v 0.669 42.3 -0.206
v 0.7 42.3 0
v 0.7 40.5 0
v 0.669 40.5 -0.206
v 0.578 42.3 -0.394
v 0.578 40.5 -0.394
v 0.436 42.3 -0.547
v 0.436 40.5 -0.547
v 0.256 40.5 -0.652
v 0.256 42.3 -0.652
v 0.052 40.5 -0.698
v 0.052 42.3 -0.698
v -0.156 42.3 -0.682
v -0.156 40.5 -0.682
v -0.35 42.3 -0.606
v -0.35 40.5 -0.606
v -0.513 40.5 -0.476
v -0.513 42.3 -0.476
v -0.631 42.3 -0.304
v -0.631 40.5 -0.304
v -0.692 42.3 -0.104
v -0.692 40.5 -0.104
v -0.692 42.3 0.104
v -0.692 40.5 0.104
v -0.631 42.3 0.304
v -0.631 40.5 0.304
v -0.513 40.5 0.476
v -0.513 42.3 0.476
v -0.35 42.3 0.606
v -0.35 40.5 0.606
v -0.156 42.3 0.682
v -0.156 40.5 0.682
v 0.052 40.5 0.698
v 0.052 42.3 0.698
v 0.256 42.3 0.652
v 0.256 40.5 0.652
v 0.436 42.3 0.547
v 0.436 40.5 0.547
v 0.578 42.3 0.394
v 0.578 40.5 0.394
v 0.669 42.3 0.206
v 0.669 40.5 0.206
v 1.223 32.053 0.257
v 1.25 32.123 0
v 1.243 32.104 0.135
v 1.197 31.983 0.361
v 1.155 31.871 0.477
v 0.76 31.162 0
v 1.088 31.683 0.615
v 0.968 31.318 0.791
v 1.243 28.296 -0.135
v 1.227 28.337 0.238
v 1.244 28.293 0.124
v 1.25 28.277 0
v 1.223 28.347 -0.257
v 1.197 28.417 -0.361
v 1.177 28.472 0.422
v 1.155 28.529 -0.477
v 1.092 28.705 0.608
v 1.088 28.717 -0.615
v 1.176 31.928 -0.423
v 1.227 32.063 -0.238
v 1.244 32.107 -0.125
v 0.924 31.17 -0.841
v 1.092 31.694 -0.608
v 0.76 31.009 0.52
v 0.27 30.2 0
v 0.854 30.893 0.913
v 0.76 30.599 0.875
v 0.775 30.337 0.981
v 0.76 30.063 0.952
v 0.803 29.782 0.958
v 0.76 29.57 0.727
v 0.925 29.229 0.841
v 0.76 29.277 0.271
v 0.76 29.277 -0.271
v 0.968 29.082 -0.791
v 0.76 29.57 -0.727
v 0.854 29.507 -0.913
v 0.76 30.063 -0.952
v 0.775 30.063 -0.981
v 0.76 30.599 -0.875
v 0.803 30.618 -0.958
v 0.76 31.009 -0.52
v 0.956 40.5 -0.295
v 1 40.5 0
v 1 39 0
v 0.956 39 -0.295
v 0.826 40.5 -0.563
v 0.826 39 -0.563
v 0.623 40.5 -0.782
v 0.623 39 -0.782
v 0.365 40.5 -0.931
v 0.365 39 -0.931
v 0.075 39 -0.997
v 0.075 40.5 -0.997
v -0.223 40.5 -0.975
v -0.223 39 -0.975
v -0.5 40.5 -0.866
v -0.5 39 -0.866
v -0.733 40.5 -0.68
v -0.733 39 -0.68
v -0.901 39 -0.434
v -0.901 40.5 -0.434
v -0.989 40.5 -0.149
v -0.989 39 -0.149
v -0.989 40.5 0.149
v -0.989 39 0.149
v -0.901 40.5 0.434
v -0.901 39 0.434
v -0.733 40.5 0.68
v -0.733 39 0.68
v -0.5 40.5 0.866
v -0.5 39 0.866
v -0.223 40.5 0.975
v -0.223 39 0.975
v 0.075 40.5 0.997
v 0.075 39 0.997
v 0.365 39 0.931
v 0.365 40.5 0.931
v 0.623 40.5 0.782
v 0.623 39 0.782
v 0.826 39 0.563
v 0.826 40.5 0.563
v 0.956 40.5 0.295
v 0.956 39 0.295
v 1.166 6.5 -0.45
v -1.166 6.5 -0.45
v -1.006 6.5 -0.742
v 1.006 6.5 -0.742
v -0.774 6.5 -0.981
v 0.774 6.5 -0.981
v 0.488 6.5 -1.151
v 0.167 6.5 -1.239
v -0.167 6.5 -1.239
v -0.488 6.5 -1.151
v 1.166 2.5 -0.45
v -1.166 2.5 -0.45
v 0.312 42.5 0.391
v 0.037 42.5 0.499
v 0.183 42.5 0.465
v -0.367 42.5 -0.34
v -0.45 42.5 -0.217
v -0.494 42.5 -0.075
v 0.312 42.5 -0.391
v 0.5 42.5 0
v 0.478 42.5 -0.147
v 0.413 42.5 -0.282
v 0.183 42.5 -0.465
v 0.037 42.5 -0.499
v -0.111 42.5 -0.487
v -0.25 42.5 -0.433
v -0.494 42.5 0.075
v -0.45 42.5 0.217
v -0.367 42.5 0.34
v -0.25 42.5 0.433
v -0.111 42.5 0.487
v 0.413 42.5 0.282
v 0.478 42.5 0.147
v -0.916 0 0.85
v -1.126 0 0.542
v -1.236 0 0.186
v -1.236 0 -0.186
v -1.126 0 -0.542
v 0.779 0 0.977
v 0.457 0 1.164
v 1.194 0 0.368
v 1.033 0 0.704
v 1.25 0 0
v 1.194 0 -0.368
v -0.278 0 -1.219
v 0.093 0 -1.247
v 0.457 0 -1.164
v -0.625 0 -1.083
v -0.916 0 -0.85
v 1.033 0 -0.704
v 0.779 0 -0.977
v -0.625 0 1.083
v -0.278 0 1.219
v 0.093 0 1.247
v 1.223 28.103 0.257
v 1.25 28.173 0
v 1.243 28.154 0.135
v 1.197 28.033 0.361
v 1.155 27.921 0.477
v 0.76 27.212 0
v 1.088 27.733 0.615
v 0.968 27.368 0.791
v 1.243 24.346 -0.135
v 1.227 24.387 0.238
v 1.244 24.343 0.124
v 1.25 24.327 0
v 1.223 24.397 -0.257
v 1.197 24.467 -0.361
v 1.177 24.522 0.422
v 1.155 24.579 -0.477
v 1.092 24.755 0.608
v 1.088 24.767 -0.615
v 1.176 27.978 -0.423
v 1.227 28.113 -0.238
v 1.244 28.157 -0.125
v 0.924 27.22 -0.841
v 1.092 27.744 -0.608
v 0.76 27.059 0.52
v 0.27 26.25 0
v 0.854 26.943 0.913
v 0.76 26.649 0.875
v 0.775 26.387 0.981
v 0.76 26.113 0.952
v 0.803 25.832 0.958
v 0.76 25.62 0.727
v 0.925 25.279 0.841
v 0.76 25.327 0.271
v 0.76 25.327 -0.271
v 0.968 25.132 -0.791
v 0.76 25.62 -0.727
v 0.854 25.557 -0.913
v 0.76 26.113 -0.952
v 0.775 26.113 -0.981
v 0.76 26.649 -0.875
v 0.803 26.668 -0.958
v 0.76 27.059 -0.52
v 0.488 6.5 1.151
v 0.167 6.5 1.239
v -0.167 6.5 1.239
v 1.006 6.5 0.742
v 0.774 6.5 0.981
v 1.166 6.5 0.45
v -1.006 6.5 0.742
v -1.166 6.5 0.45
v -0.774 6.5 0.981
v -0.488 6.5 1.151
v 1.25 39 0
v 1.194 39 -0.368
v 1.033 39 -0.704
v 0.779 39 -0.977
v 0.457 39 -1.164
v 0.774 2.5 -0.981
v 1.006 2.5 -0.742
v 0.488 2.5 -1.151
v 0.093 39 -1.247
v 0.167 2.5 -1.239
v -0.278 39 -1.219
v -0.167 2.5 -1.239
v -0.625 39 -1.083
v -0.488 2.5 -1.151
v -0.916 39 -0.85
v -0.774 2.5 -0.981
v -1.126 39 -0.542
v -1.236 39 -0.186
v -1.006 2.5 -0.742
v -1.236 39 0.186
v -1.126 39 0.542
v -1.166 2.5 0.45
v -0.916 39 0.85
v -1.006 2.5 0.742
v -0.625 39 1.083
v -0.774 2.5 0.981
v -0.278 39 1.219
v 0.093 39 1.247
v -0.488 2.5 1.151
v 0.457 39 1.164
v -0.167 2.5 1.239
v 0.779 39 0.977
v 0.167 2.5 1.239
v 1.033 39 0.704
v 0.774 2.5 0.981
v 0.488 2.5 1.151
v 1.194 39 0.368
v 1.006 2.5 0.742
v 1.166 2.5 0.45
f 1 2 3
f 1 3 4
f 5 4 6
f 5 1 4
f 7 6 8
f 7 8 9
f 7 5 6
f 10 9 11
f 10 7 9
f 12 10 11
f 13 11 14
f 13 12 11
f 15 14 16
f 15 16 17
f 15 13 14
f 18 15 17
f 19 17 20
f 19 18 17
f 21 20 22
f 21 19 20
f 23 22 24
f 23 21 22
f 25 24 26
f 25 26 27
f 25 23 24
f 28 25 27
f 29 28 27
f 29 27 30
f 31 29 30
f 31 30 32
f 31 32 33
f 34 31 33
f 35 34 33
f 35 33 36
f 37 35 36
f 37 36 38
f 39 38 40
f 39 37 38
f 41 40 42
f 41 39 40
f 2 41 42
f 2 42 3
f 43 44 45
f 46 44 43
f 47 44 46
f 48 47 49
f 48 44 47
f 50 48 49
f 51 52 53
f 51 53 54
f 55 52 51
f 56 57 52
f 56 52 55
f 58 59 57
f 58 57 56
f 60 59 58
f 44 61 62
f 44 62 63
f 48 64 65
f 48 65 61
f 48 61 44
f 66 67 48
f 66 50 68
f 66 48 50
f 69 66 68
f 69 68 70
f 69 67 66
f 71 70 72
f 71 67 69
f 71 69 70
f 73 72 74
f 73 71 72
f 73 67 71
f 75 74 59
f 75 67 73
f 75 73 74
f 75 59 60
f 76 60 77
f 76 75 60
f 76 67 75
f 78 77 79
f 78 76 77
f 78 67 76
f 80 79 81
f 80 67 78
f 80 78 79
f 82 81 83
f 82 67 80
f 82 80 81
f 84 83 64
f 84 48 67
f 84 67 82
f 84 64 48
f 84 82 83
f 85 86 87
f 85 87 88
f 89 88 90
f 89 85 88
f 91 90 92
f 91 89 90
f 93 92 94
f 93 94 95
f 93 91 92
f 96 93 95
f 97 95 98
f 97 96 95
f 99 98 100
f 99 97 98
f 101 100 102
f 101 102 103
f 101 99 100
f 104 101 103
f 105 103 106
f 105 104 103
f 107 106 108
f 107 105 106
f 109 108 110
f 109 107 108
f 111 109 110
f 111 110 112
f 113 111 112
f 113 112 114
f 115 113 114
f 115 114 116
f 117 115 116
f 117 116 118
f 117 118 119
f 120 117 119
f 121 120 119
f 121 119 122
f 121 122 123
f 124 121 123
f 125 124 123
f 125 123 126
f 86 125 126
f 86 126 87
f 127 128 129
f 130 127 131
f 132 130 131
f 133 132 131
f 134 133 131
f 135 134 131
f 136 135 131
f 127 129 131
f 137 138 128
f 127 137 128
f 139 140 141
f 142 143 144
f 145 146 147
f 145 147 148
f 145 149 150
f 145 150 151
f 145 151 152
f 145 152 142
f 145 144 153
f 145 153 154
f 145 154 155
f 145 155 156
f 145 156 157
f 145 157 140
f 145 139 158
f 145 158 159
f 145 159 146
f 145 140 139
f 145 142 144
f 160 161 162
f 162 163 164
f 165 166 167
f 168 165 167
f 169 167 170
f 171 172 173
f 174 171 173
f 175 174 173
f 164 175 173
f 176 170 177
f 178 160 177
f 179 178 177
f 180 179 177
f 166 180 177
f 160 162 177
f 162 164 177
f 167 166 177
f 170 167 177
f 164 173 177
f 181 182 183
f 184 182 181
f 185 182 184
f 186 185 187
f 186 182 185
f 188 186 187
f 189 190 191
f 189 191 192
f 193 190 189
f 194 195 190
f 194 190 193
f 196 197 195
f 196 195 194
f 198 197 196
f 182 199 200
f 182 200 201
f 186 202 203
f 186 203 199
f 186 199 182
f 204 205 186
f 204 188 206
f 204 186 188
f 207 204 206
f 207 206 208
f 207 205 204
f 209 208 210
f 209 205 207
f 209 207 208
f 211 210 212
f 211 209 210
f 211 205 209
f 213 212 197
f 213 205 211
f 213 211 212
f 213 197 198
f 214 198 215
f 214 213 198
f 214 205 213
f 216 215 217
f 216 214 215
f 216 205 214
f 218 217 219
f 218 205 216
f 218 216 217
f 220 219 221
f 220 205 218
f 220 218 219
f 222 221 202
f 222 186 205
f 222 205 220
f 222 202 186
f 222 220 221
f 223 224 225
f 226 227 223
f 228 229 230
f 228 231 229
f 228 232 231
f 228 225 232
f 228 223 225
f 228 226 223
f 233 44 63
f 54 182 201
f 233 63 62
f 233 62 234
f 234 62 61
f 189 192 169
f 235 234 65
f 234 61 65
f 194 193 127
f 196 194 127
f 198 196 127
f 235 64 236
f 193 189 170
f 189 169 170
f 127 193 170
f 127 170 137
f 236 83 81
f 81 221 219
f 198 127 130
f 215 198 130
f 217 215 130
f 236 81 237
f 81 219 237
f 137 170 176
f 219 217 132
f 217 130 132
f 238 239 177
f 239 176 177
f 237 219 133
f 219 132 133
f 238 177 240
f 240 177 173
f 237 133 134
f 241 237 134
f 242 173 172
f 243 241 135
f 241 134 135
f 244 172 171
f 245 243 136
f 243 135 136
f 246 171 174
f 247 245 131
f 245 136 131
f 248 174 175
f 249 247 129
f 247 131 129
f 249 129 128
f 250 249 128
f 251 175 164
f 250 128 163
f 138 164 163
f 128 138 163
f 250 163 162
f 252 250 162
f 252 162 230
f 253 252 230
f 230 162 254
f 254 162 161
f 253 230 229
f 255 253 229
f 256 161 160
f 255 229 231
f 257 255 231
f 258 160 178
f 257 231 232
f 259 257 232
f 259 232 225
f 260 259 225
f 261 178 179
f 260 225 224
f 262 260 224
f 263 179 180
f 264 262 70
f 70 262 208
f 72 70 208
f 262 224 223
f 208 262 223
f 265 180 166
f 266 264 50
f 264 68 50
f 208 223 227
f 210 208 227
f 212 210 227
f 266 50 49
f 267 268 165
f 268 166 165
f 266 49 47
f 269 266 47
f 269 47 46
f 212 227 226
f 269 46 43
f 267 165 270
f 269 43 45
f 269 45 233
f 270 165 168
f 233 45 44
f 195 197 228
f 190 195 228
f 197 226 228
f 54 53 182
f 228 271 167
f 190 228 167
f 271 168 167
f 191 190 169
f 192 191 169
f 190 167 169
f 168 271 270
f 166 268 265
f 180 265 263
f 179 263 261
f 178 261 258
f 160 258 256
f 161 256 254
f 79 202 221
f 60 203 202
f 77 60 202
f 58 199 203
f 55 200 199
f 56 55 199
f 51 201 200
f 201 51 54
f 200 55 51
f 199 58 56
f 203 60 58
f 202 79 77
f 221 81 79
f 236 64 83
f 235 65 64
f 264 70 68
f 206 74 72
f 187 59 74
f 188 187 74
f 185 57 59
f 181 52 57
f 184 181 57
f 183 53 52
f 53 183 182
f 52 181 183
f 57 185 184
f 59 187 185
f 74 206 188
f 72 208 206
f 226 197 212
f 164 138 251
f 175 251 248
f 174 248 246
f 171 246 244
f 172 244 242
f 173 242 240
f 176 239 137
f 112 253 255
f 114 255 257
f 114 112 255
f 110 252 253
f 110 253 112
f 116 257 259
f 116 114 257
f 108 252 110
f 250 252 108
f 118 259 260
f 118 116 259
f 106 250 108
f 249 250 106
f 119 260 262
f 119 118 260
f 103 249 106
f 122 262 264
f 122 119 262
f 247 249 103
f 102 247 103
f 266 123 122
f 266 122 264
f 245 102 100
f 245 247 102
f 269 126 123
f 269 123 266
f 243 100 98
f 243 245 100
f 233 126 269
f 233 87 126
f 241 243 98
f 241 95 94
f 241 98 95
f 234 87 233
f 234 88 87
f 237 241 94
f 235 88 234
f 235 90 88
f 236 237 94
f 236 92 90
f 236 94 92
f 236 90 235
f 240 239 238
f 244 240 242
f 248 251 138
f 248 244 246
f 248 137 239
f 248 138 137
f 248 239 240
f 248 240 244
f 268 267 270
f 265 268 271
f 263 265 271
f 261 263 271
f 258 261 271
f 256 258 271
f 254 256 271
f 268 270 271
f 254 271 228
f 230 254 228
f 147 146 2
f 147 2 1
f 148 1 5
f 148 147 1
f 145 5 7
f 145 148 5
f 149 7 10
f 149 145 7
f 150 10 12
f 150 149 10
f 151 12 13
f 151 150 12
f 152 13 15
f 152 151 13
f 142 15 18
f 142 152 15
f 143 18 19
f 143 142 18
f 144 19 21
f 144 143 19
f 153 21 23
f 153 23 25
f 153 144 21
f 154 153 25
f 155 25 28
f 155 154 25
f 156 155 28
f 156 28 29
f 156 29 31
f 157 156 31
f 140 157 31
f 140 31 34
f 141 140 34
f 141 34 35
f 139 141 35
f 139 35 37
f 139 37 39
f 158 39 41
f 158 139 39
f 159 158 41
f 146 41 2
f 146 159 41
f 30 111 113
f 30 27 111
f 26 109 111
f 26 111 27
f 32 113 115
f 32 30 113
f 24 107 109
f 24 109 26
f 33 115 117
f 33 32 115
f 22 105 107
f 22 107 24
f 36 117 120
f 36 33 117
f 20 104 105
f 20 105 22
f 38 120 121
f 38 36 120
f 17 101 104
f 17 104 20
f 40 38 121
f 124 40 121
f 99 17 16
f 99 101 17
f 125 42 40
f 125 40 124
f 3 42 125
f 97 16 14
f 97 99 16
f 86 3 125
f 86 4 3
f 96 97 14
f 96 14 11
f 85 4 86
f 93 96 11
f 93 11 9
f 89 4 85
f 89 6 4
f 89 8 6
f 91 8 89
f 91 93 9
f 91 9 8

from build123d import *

# Parameters (mm, degrees)
SKETCH1_R               = 1.25
BOSS_EXTRUDE1_DEPTH     = 42.5
SKETCH2_OUTSIDE_W       = 13.03
SKETCH2_OUTSIDE_H       = 13.03
SKETCH2_OUTSIDE_R       = 1
CUT_EXTRUDE1_DEPTH      = 3.5
SKETCH3_OUTSIDE_W       = 13.03
SKETCH3_OUTSIDE_H       = 13.03
SKETCH3_OUTSIDE_R       = 0.7
CUT_EXTRUDE2_DEPTH      = 2
CHAMFER1_SIZE           = 0.2
SKETCH4_W               = 0.8
SKETCH4_H               = 4
CUT_EXTRUDE3_DEPTH      = 2.25
CUT_EXTRUDE3_DEPTH_BACK = 2.25
LPATTERN1_COUNT         = 2
LPATTERN1_PITCH         = 3.95


with BuildPart() as part:
    # Sketch1 → Boss-Extrude1 (new body)
    with BuildSketch(Plane(origin=(0, 0, 0), x_dir=(1, 0, 0), z_dir=(0, 1, 0))):
        Circle(SKETCH1_R)
    extrude(amount=BOSS_EXTRUDE1_DEPTH)

    # Sketch2 outside → Cut-Extrude1 (cut)
    with BuildSketch(Plane(origin=(0, 42.5, 0), x_dir=(1, 0, 0), z_dir=(0, 1, 0))):
        Rectangle(SKETCH2_OUTSIDE_W, SKETCH2_OUTSIDE_H)
        Circle(SKETCH2_OUTSIDE_R, mode=Mode.SUBTRACT)
    extrude(amount=-CUT_EXTRUDE1_DEPTH, mode=Mode.SUBTRACT)

    # Sketch3 outside → Cut-Extrude2 (cut)
    with BuildSketch(Plane(origin=(0, 42.5, 0), x_dir=(1, 0, 0), z_dir=(0, 1, 0))):
        Rectangle(SKETCH3_OUTSIDE_W, SKETCH3_OUTSIDE_H)
        Circle(SKETCH3_OUTSIDE_R, mode=Mode.SUBTRACT)
    extrude(amount=-CUT_EXTRUDE2_DEPTH, mode=Mode.SUBTRACT)

    # Chamfer1
    chamfer1_edges = [part.edges().sort_by_distance(p)[0] for p in [
        (-0.7, 42.5, 0),
    ]]
    chamfer(chamfer1_edges, length=CHAMFER1_SIZE)

    # Sketch4 → Cut-Extrude3 (cut, two sides)
    with BuildSketch(Plane(origin=(0, 0, 0), x_dir=(0, 0, -1), z_dir=(1, 0, 0))) as cut_extrude3_sk:
        with Locations((0.85, 4.5)):
            Rectangle(SKETCH4_W, SKETCH4_H)
        with Locations((-0.85, 4.5)):
            Rectangle(SKETCH4_W, SKETCH4_H)
    extrude(amount=CUT_EXTRUDE3_DEPTH, mode=Mode.SUBTRACT)
    extrude(cut_extrude3_sk.sketch, amount=-CUT_EXTRUDE3_DEPTH_BACK, mode=Mode.SUBTRACT)

    # Sketch5 → Cut-Revolve2 (revolve, cut)
    with BuildSketch(Plane.XY):
        Polygon((1.25, 32.123358295), (0.27, 30.2), (1.25, 30.2), align=None)
    cut_revolve2 = revolve(axis=Axis((0.27, 30.2, 0), (1, 0, 0)), mode=Mode.SUBTRACT)

    # LPattern1: Cut-Revolve2 ×2
    with Locations(*[(0, -i * LPATTERN1_PITCH, 0) for i in range(1, LPATTERN1_COUNT)]):
        add(cut_revolve2, mode=Mode.SUBTRACT)


solid = part.part
